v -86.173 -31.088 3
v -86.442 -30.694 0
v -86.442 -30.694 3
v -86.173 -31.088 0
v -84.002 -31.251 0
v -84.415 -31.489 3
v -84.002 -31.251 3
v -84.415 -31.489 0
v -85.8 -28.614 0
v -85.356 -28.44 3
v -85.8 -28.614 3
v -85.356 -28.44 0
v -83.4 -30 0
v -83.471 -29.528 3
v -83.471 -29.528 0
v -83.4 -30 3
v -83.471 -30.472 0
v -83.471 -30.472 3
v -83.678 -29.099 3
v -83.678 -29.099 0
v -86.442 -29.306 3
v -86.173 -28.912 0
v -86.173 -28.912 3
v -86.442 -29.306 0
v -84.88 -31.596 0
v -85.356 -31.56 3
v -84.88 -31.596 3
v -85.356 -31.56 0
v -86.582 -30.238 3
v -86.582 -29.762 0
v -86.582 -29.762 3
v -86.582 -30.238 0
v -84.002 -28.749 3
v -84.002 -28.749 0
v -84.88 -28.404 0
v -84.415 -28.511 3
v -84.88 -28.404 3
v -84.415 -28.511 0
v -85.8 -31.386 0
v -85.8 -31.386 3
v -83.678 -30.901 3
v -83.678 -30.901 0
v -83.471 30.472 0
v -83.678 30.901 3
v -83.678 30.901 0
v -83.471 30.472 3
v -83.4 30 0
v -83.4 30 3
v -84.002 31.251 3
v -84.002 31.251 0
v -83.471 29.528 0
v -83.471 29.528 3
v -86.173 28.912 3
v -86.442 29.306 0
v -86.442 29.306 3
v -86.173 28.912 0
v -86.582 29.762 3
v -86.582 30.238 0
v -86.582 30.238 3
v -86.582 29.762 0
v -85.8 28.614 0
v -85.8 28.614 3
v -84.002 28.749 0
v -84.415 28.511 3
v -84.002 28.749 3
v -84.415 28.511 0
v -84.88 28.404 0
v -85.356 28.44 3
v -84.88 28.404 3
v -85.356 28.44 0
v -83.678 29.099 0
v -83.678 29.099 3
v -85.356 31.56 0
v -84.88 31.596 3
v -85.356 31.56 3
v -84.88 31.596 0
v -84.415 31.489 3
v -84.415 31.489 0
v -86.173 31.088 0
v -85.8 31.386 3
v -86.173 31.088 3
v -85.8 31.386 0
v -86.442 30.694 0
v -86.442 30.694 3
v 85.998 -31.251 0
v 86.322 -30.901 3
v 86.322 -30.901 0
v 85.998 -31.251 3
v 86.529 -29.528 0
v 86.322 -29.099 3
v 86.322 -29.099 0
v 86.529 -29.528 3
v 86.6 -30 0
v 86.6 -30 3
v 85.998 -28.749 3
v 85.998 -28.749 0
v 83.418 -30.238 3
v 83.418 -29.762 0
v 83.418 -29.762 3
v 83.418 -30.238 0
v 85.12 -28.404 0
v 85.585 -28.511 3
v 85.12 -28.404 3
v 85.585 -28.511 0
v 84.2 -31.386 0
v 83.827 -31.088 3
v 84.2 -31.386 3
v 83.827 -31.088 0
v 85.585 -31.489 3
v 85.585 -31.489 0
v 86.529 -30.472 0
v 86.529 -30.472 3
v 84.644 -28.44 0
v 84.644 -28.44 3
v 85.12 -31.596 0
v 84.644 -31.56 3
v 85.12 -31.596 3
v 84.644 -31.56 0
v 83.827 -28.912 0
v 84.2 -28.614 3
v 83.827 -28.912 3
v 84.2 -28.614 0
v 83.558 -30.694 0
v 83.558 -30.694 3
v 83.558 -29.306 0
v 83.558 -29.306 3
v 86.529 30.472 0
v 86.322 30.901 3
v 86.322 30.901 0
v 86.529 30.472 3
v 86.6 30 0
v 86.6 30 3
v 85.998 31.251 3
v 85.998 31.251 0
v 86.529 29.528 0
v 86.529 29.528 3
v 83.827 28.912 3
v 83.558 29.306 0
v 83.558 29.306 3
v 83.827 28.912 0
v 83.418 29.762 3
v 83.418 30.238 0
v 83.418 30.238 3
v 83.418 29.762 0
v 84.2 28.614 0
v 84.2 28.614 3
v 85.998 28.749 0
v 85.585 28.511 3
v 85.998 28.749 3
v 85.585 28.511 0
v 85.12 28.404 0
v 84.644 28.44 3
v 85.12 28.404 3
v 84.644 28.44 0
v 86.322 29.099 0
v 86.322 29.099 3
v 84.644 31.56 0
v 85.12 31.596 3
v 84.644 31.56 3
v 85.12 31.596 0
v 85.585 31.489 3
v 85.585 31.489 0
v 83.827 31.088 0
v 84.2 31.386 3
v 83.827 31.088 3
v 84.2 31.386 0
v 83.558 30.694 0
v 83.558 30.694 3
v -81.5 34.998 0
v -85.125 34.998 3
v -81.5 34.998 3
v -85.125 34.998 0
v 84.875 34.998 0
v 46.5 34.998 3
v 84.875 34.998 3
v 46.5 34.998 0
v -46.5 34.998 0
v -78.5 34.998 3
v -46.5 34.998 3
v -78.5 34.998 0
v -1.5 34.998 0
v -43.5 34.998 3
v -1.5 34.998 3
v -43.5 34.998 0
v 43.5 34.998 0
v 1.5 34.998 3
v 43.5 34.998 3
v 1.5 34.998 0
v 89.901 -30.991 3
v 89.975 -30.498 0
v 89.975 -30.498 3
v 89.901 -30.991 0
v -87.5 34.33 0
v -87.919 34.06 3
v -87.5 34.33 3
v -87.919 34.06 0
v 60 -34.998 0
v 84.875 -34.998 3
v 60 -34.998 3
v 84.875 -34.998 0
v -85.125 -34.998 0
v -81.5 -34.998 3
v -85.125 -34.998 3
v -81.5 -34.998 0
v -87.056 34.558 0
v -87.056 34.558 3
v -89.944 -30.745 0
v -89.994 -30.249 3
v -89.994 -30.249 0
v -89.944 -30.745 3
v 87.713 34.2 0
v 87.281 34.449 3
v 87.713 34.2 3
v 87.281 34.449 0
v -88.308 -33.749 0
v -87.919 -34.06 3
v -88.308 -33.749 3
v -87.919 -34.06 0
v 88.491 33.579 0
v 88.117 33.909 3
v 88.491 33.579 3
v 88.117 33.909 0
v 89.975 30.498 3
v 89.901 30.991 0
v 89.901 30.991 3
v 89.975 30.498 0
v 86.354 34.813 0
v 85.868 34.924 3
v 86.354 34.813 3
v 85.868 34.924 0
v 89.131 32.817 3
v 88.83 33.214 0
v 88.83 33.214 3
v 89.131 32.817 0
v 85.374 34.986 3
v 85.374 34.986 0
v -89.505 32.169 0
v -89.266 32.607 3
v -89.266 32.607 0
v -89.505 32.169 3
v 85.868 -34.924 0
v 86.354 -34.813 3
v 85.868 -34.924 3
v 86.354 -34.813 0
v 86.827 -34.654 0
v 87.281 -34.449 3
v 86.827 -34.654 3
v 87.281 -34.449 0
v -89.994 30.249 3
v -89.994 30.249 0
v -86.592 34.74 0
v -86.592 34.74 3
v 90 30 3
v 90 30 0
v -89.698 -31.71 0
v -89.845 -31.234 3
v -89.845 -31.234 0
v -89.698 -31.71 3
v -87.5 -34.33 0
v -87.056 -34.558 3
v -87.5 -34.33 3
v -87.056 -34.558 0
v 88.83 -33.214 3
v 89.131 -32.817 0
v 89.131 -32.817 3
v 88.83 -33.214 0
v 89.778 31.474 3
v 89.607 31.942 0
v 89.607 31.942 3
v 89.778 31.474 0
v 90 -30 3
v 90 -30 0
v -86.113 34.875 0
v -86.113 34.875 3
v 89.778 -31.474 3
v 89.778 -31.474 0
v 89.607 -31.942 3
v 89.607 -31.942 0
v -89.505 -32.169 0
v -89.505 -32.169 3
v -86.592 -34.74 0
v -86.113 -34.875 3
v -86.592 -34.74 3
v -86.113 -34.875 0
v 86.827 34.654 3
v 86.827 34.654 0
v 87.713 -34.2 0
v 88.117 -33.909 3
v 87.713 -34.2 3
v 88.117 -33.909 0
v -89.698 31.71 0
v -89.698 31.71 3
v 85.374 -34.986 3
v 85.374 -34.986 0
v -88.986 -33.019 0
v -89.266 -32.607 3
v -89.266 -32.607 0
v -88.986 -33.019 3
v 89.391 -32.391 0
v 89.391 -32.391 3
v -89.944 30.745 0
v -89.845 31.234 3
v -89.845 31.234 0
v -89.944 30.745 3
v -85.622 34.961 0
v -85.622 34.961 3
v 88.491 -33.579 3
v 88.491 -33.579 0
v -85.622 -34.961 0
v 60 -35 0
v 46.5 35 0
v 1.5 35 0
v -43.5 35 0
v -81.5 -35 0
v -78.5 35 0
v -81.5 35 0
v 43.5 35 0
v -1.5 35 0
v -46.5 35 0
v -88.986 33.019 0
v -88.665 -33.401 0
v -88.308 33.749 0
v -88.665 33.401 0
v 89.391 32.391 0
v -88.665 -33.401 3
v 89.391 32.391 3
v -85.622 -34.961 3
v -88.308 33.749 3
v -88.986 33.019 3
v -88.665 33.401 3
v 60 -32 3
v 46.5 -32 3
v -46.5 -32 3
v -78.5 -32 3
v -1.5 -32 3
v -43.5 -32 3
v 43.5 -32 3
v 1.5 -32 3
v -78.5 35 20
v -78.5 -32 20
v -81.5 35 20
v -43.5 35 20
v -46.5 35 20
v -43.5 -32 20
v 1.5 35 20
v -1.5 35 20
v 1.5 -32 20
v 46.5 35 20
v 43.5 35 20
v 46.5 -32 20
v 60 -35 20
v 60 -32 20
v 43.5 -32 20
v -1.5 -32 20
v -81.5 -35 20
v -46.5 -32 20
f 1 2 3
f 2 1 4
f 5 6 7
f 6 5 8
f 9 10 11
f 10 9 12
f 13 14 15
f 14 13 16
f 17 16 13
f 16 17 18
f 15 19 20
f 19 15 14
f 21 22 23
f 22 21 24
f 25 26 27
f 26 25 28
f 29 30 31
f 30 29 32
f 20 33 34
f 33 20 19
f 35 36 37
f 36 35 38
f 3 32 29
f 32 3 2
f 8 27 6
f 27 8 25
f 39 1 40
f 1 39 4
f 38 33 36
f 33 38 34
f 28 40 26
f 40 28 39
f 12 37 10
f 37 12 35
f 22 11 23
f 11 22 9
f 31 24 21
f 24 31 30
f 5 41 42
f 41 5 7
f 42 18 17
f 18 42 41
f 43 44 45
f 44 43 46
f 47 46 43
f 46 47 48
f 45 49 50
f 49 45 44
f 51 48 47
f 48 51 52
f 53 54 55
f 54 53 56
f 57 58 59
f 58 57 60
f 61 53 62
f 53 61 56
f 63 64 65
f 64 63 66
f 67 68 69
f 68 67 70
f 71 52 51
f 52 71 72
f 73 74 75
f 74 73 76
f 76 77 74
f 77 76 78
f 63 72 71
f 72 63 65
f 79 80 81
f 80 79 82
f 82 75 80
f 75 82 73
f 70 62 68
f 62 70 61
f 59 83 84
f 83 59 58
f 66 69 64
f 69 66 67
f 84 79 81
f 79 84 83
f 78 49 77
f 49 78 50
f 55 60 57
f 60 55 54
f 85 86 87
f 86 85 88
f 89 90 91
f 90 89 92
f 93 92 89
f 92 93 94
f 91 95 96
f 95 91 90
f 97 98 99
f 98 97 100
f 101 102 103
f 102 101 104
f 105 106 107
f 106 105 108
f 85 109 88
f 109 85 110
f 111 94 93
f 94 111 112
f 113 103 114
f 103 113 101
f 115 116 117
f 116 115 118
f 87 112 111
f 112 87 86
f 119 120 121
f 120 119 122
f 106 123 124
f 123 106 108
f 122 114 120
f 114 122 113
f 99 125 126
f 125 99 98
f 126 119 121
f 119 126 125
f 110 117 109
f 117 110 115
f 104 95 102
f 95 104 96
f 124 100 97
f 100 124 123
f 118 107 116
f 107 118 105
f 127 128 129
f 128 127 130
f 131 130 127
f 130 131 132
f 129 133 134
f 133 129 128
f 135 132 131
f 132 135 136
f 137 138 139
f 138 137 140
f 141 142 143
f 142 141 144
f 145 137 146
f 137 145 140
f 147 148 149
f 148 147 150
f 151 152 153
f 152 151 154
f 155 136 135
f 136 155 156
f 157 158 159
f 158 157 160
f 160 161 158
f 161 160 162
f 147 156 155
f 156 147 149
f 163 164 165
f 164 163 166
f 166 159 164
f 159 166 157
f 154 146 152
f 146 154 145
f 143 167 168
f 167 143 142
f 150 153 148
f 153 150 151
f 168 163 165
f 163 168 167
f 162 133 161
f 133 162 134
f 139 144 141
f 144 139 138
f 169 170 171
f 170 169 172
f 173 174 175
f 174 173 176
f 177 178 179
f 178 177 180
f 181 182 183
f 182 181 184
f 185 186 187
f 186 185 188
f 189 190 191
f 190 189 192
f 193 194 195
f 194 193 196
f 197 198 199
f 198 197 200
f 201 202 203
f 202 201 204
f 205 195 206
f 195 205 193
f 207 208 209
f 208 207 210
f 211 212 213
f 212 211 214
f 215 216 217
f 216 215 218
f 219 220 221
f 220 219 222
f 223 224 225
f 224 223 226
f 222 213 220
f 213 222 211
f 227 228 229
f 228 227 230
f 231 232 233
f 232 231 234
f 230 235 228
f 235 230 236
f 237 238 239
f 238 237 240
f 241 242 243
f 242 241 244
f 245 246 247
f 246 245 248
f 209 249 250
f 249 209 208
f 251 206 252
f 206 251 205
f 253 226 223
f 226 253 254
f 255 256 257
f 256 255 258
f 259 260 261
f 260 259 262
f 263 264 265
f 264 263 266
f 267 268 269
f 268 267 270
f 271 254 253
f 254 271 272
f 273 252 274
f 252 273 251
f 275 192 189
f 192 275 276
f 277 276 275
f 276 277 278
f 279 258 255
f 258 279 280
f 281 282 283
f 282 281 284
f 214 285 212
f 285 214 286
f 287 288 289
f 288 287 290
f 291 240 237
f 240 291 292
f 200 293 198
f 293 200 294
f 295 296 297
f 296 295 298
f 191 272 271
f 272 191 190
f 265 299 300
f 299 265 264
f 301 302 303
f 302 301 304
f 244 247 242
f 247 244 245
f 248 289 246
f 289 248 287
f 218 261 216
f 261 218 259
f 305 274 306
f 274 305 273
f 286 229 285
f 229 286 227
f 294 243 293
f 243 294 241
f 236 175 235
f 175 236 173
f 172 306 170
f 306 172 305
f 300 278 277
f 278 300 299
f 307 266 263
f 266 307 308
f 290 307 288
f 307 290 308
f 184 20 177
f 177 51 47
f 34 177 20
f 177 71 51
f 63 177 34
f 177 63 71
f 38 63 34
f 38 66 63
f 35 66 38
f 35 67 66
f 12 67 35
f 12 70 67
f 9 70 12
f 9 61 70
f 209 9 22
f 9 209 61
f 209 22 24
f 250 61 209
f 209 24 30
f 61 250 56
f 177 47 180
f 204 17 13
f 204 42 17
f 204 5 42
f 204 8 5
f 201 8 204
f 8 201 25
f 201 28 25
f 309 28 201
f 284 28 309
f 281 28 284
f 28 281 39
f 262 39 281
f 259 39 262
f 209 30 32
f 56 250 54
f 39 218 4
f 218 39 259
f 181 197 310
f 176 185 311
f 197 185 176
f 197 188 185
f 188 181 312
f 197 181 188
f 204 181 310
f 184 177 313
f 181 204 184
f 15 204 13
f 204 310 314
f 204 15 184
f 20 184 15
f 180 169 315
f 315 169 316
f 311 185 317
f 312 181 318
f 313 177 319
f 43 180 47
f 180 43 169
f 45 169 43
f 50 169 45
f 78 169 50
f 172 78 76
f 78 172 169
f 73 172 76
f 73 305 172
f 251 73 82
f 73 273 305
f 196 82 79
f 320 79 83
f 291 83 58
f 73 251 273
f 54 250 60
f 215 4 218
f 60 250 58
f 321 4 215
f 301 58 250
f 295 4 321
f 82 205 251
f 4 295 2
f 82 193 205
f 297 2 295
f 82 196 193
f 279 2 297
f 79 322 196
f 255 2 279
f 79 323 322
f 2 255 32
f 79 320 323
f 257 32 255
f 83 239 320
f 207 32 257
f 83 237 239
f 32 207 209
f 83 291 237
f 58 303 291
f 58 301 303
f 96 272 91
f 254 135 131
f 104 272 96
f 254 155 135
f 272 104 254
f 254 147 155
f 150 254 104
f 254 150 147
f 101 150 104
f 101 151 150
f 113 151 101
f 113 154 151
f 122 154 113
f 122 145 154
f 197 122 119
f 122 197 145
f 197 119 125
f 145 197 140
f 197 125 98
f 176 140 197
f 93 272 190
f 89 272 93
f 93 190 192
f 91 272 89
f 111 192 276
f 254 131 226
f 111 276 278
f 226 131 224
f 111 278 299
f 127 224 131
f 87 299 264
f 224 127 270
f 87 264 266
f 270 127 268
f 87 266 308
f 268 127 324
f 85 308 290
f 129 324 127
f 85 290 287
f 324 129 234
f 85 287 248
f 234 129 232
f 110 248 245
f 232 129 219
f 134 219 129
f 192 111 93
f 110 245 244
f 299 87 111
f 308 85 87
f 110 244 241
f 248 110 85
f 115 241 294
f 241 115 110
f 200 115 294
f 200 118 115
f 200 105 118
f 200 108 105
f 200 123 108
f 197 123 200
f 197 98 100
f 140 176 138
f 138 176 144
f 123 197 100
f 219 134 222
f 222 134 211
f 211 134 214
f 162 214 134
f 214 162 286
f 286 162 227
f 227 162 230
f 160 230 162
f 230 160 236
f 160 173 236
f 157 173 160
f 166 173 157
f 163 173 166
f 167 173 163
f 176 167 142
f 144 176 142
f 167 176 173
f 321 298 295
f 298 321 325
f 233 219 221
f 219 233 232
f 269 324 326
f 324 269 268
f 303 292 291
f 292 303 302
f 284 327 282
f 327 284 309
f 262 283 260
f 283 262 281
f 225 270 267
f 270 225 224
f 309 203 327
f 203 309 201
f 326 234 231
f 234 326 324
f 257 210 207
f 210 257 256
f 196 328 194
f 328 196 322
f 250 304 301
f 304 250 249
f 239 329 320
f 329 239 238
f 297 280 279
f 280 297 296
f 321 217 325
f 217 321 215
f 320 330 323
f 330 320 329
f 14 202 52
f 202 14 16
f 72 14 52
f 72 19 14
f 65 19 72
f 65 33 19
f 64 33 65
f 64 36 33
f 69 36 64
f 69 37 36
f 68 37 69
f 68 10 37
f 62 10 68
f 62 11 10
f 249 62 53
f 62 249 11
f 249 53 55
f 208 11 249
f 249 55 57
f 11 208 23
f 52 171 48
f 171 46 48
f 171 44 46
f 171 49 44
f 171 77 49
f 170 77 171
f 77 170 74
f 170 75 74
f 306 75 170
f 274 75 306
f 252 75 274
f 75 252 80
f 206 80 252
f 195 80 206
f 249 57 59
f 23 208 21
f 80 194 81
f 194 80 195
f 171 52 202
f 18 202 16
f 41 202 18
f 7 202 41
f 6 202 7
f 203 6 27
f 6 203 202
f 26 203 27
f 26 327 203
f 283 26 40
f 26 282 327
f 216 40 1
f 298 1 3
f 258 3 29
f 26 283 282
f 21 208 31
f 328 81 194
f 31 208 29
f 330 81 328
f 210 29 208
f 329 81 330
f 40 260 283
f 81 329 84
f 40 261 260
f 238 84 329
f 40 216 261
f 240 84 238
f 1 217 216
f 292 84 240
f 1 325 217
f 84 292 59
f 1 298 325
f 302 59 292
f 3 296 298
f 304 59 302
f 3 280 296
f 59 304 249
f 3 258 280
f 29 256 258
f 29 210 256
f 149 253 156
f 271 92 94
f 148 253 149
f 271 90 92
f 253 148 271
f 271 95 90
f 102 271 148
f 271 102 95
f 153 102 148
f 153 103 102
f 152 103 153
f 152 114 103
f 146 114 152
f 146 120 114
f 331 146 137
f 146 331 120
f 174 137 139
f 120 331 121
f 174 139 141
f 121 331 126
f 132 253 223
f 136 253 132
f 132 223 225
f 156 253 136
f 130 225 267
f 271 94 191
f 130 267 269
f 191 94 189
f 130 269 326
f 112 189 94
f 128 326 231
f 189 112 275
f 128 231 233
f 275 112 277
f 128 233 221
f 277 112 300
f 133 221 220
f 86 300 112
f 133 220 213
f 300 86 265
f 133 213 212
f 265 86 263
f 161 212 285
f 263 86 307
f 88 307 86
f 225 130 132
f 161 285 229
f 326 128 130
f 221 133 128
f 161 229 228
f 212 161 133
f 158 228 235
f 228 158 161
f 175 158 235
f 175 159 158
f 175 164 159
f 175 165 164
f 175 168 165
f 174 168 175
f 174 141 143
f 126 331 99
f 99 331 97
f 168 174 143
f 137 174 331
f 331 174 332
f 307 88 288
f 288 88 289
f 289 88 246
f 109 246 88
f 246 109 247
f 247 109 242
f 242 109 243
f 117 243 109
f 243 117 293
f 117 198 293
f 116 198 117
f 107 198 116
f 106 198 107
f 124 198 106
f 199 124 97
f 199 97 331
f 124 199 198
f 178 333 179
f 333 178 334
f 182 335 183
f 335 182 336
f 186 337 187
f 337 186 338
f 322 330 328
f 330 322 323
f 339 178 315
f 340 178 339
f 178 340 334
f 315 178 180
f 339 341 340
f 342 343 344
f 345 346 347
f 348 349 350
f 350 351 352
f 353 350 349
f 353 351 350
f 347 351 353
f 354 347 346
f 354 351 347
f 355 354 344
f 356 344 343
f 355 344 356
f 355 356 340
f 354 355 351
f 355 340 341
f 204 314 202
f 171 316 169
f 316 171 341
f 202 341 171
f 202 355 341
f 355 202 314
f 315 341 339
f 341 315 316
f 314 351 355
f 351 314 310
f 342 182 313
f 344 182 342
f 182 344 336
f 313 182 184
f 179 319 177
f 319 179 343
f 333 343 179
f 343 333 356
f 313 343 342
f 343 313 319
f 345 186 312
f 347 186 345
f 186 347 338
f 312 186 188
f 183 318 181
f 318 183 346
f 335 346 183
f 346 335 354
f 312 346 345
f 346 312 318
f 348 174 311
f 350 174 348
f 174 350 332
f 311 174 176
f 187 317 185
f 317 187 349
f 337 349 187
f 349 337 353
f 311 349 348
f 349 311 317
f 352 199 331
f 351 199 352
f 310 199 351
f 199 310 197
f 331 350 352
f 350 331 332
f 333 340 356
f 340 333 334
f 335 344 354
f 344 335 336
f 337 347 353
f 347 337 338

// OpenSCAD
include <../config.scad>

$fs=$fs/4;
$fa=$fa/4;

e  = 6;

trieur_l = 180;
trieur_lg = 100;

angle1 = 40;
angle2 = 7;
h=-10;

module trieur_old(){
    l = -trieur_l/2-5;
    lg = -trieur_lg/2-5;
    difference(){
        hull(){
            translate([l, lg])cylinder(r=5,10);
            translate([l, -lg])cylinder(r=5,10);
            translate([-l, lg])cylinder(r=5,10);
            translate([-l, -lg])cylinder(r=5,10);
        }
        rotate([0,-4,0]) translate([-80,0,-3]) hull(){
             for(i=[0,1]){
                  mirror([0,i,0])rotate([20,0,0])cube([300,0.1,40]);
             }
         }
    }
    
}


module part(){
    rotate([0,angle2,0]) translate([-90,0,h]) hull(){
         for(i=[0,1]){
              mirror([0,i,0])rotate([angle1,0,0])cube([300,0.1,40]);
         }
     }
}

module base_trieur(h=4){
    l = trieur_l/2-5;
    lg = trieur_lg/2-5-15;
    difference(){
        hull(){
            translate([l, lg])cylinder(r=5,h);
            translate([l, -lg])cylinder(r=5,h);
            translate([-l, lg])cylinder(r=5,h);
            translate([-l, -lg])cylinder(r=5,h);
        }
        for(i=[-1,1]){
            for(j=[-1,1]){
                translate([i*l, j*lg, -1])cylinder(r=1.6,h+2);
            }
        }
    }
    
}

module trieur(){
    difference(){
        union(){
            hull(){
                intersection(){
                    part();
                    translate([-trieur_l/2, -trieur_l/2]) cube([trieur_l,trieur_l,100]);
                }
                translate([-trieur_l/2, -trieur_lg/4]) cube([trieur_l,trieur_lg/2,1]);
            }
            base_trieur();
        }
        translate([3, 0, 3])  part();
    }
}
module dessous(){
    lg = trieur_lg-30;
    e =3;
    difference(){
        union(){
            base_trieur(e);
            
            for(i = [-trieur_l/2+10,-trieur_l/4, 0, trieur_l/4]){
                translate([i-e/2,-lg/2,0])cube([e,lg,20]);
            }
            translate([-trieur_l/2+10,-lg/2,0])cube([trieur_l-40,e,20]);
        }
    }
}

module pied(){
    pied_e = 1;
    pied_h = 10;
    pied_lg = 10;
    pied_de = 5;
    difference(){
        union(){
            translate([-pied_lg/2,-5,0]) cube([pied_lg,10, pied_lg]);
            translate([-pied_lg/2,50-7,0]) cube([pied_lg,10, pied_lg]);
            for(i=[0:9]){
                translate([0,i*pied_de]) hull(){
                    translate([-pied_lg/2,0,0]) cylinder(r=pied_e, pied_h);
                    translate([pied_lg/2,pied_de,0]) cylinder(r=pied_e, pied_h);
                }
                translate([0,i*pied_de]) hull(){
                    translate([-pied_lg/2,pied_de,0]) cylinder(r=pied_e, pied_h);
                    translate([pied_lg/2,0,0]) cylinder(r=pied_e, pied_h);
                }
            }
        }
        translate([0,0,5]) rotate([0,-90,90]) m3_nut(10,10,10);
        translate([0,0,5]) rotate([0,-90,90]) cylinder(1000,r=3.2/2, center= true);
        translate([0,50,5]) rotate([0,-90,90]) m3_nut(10,10,10);
    }
    
    
}

dessous();
//pied();
